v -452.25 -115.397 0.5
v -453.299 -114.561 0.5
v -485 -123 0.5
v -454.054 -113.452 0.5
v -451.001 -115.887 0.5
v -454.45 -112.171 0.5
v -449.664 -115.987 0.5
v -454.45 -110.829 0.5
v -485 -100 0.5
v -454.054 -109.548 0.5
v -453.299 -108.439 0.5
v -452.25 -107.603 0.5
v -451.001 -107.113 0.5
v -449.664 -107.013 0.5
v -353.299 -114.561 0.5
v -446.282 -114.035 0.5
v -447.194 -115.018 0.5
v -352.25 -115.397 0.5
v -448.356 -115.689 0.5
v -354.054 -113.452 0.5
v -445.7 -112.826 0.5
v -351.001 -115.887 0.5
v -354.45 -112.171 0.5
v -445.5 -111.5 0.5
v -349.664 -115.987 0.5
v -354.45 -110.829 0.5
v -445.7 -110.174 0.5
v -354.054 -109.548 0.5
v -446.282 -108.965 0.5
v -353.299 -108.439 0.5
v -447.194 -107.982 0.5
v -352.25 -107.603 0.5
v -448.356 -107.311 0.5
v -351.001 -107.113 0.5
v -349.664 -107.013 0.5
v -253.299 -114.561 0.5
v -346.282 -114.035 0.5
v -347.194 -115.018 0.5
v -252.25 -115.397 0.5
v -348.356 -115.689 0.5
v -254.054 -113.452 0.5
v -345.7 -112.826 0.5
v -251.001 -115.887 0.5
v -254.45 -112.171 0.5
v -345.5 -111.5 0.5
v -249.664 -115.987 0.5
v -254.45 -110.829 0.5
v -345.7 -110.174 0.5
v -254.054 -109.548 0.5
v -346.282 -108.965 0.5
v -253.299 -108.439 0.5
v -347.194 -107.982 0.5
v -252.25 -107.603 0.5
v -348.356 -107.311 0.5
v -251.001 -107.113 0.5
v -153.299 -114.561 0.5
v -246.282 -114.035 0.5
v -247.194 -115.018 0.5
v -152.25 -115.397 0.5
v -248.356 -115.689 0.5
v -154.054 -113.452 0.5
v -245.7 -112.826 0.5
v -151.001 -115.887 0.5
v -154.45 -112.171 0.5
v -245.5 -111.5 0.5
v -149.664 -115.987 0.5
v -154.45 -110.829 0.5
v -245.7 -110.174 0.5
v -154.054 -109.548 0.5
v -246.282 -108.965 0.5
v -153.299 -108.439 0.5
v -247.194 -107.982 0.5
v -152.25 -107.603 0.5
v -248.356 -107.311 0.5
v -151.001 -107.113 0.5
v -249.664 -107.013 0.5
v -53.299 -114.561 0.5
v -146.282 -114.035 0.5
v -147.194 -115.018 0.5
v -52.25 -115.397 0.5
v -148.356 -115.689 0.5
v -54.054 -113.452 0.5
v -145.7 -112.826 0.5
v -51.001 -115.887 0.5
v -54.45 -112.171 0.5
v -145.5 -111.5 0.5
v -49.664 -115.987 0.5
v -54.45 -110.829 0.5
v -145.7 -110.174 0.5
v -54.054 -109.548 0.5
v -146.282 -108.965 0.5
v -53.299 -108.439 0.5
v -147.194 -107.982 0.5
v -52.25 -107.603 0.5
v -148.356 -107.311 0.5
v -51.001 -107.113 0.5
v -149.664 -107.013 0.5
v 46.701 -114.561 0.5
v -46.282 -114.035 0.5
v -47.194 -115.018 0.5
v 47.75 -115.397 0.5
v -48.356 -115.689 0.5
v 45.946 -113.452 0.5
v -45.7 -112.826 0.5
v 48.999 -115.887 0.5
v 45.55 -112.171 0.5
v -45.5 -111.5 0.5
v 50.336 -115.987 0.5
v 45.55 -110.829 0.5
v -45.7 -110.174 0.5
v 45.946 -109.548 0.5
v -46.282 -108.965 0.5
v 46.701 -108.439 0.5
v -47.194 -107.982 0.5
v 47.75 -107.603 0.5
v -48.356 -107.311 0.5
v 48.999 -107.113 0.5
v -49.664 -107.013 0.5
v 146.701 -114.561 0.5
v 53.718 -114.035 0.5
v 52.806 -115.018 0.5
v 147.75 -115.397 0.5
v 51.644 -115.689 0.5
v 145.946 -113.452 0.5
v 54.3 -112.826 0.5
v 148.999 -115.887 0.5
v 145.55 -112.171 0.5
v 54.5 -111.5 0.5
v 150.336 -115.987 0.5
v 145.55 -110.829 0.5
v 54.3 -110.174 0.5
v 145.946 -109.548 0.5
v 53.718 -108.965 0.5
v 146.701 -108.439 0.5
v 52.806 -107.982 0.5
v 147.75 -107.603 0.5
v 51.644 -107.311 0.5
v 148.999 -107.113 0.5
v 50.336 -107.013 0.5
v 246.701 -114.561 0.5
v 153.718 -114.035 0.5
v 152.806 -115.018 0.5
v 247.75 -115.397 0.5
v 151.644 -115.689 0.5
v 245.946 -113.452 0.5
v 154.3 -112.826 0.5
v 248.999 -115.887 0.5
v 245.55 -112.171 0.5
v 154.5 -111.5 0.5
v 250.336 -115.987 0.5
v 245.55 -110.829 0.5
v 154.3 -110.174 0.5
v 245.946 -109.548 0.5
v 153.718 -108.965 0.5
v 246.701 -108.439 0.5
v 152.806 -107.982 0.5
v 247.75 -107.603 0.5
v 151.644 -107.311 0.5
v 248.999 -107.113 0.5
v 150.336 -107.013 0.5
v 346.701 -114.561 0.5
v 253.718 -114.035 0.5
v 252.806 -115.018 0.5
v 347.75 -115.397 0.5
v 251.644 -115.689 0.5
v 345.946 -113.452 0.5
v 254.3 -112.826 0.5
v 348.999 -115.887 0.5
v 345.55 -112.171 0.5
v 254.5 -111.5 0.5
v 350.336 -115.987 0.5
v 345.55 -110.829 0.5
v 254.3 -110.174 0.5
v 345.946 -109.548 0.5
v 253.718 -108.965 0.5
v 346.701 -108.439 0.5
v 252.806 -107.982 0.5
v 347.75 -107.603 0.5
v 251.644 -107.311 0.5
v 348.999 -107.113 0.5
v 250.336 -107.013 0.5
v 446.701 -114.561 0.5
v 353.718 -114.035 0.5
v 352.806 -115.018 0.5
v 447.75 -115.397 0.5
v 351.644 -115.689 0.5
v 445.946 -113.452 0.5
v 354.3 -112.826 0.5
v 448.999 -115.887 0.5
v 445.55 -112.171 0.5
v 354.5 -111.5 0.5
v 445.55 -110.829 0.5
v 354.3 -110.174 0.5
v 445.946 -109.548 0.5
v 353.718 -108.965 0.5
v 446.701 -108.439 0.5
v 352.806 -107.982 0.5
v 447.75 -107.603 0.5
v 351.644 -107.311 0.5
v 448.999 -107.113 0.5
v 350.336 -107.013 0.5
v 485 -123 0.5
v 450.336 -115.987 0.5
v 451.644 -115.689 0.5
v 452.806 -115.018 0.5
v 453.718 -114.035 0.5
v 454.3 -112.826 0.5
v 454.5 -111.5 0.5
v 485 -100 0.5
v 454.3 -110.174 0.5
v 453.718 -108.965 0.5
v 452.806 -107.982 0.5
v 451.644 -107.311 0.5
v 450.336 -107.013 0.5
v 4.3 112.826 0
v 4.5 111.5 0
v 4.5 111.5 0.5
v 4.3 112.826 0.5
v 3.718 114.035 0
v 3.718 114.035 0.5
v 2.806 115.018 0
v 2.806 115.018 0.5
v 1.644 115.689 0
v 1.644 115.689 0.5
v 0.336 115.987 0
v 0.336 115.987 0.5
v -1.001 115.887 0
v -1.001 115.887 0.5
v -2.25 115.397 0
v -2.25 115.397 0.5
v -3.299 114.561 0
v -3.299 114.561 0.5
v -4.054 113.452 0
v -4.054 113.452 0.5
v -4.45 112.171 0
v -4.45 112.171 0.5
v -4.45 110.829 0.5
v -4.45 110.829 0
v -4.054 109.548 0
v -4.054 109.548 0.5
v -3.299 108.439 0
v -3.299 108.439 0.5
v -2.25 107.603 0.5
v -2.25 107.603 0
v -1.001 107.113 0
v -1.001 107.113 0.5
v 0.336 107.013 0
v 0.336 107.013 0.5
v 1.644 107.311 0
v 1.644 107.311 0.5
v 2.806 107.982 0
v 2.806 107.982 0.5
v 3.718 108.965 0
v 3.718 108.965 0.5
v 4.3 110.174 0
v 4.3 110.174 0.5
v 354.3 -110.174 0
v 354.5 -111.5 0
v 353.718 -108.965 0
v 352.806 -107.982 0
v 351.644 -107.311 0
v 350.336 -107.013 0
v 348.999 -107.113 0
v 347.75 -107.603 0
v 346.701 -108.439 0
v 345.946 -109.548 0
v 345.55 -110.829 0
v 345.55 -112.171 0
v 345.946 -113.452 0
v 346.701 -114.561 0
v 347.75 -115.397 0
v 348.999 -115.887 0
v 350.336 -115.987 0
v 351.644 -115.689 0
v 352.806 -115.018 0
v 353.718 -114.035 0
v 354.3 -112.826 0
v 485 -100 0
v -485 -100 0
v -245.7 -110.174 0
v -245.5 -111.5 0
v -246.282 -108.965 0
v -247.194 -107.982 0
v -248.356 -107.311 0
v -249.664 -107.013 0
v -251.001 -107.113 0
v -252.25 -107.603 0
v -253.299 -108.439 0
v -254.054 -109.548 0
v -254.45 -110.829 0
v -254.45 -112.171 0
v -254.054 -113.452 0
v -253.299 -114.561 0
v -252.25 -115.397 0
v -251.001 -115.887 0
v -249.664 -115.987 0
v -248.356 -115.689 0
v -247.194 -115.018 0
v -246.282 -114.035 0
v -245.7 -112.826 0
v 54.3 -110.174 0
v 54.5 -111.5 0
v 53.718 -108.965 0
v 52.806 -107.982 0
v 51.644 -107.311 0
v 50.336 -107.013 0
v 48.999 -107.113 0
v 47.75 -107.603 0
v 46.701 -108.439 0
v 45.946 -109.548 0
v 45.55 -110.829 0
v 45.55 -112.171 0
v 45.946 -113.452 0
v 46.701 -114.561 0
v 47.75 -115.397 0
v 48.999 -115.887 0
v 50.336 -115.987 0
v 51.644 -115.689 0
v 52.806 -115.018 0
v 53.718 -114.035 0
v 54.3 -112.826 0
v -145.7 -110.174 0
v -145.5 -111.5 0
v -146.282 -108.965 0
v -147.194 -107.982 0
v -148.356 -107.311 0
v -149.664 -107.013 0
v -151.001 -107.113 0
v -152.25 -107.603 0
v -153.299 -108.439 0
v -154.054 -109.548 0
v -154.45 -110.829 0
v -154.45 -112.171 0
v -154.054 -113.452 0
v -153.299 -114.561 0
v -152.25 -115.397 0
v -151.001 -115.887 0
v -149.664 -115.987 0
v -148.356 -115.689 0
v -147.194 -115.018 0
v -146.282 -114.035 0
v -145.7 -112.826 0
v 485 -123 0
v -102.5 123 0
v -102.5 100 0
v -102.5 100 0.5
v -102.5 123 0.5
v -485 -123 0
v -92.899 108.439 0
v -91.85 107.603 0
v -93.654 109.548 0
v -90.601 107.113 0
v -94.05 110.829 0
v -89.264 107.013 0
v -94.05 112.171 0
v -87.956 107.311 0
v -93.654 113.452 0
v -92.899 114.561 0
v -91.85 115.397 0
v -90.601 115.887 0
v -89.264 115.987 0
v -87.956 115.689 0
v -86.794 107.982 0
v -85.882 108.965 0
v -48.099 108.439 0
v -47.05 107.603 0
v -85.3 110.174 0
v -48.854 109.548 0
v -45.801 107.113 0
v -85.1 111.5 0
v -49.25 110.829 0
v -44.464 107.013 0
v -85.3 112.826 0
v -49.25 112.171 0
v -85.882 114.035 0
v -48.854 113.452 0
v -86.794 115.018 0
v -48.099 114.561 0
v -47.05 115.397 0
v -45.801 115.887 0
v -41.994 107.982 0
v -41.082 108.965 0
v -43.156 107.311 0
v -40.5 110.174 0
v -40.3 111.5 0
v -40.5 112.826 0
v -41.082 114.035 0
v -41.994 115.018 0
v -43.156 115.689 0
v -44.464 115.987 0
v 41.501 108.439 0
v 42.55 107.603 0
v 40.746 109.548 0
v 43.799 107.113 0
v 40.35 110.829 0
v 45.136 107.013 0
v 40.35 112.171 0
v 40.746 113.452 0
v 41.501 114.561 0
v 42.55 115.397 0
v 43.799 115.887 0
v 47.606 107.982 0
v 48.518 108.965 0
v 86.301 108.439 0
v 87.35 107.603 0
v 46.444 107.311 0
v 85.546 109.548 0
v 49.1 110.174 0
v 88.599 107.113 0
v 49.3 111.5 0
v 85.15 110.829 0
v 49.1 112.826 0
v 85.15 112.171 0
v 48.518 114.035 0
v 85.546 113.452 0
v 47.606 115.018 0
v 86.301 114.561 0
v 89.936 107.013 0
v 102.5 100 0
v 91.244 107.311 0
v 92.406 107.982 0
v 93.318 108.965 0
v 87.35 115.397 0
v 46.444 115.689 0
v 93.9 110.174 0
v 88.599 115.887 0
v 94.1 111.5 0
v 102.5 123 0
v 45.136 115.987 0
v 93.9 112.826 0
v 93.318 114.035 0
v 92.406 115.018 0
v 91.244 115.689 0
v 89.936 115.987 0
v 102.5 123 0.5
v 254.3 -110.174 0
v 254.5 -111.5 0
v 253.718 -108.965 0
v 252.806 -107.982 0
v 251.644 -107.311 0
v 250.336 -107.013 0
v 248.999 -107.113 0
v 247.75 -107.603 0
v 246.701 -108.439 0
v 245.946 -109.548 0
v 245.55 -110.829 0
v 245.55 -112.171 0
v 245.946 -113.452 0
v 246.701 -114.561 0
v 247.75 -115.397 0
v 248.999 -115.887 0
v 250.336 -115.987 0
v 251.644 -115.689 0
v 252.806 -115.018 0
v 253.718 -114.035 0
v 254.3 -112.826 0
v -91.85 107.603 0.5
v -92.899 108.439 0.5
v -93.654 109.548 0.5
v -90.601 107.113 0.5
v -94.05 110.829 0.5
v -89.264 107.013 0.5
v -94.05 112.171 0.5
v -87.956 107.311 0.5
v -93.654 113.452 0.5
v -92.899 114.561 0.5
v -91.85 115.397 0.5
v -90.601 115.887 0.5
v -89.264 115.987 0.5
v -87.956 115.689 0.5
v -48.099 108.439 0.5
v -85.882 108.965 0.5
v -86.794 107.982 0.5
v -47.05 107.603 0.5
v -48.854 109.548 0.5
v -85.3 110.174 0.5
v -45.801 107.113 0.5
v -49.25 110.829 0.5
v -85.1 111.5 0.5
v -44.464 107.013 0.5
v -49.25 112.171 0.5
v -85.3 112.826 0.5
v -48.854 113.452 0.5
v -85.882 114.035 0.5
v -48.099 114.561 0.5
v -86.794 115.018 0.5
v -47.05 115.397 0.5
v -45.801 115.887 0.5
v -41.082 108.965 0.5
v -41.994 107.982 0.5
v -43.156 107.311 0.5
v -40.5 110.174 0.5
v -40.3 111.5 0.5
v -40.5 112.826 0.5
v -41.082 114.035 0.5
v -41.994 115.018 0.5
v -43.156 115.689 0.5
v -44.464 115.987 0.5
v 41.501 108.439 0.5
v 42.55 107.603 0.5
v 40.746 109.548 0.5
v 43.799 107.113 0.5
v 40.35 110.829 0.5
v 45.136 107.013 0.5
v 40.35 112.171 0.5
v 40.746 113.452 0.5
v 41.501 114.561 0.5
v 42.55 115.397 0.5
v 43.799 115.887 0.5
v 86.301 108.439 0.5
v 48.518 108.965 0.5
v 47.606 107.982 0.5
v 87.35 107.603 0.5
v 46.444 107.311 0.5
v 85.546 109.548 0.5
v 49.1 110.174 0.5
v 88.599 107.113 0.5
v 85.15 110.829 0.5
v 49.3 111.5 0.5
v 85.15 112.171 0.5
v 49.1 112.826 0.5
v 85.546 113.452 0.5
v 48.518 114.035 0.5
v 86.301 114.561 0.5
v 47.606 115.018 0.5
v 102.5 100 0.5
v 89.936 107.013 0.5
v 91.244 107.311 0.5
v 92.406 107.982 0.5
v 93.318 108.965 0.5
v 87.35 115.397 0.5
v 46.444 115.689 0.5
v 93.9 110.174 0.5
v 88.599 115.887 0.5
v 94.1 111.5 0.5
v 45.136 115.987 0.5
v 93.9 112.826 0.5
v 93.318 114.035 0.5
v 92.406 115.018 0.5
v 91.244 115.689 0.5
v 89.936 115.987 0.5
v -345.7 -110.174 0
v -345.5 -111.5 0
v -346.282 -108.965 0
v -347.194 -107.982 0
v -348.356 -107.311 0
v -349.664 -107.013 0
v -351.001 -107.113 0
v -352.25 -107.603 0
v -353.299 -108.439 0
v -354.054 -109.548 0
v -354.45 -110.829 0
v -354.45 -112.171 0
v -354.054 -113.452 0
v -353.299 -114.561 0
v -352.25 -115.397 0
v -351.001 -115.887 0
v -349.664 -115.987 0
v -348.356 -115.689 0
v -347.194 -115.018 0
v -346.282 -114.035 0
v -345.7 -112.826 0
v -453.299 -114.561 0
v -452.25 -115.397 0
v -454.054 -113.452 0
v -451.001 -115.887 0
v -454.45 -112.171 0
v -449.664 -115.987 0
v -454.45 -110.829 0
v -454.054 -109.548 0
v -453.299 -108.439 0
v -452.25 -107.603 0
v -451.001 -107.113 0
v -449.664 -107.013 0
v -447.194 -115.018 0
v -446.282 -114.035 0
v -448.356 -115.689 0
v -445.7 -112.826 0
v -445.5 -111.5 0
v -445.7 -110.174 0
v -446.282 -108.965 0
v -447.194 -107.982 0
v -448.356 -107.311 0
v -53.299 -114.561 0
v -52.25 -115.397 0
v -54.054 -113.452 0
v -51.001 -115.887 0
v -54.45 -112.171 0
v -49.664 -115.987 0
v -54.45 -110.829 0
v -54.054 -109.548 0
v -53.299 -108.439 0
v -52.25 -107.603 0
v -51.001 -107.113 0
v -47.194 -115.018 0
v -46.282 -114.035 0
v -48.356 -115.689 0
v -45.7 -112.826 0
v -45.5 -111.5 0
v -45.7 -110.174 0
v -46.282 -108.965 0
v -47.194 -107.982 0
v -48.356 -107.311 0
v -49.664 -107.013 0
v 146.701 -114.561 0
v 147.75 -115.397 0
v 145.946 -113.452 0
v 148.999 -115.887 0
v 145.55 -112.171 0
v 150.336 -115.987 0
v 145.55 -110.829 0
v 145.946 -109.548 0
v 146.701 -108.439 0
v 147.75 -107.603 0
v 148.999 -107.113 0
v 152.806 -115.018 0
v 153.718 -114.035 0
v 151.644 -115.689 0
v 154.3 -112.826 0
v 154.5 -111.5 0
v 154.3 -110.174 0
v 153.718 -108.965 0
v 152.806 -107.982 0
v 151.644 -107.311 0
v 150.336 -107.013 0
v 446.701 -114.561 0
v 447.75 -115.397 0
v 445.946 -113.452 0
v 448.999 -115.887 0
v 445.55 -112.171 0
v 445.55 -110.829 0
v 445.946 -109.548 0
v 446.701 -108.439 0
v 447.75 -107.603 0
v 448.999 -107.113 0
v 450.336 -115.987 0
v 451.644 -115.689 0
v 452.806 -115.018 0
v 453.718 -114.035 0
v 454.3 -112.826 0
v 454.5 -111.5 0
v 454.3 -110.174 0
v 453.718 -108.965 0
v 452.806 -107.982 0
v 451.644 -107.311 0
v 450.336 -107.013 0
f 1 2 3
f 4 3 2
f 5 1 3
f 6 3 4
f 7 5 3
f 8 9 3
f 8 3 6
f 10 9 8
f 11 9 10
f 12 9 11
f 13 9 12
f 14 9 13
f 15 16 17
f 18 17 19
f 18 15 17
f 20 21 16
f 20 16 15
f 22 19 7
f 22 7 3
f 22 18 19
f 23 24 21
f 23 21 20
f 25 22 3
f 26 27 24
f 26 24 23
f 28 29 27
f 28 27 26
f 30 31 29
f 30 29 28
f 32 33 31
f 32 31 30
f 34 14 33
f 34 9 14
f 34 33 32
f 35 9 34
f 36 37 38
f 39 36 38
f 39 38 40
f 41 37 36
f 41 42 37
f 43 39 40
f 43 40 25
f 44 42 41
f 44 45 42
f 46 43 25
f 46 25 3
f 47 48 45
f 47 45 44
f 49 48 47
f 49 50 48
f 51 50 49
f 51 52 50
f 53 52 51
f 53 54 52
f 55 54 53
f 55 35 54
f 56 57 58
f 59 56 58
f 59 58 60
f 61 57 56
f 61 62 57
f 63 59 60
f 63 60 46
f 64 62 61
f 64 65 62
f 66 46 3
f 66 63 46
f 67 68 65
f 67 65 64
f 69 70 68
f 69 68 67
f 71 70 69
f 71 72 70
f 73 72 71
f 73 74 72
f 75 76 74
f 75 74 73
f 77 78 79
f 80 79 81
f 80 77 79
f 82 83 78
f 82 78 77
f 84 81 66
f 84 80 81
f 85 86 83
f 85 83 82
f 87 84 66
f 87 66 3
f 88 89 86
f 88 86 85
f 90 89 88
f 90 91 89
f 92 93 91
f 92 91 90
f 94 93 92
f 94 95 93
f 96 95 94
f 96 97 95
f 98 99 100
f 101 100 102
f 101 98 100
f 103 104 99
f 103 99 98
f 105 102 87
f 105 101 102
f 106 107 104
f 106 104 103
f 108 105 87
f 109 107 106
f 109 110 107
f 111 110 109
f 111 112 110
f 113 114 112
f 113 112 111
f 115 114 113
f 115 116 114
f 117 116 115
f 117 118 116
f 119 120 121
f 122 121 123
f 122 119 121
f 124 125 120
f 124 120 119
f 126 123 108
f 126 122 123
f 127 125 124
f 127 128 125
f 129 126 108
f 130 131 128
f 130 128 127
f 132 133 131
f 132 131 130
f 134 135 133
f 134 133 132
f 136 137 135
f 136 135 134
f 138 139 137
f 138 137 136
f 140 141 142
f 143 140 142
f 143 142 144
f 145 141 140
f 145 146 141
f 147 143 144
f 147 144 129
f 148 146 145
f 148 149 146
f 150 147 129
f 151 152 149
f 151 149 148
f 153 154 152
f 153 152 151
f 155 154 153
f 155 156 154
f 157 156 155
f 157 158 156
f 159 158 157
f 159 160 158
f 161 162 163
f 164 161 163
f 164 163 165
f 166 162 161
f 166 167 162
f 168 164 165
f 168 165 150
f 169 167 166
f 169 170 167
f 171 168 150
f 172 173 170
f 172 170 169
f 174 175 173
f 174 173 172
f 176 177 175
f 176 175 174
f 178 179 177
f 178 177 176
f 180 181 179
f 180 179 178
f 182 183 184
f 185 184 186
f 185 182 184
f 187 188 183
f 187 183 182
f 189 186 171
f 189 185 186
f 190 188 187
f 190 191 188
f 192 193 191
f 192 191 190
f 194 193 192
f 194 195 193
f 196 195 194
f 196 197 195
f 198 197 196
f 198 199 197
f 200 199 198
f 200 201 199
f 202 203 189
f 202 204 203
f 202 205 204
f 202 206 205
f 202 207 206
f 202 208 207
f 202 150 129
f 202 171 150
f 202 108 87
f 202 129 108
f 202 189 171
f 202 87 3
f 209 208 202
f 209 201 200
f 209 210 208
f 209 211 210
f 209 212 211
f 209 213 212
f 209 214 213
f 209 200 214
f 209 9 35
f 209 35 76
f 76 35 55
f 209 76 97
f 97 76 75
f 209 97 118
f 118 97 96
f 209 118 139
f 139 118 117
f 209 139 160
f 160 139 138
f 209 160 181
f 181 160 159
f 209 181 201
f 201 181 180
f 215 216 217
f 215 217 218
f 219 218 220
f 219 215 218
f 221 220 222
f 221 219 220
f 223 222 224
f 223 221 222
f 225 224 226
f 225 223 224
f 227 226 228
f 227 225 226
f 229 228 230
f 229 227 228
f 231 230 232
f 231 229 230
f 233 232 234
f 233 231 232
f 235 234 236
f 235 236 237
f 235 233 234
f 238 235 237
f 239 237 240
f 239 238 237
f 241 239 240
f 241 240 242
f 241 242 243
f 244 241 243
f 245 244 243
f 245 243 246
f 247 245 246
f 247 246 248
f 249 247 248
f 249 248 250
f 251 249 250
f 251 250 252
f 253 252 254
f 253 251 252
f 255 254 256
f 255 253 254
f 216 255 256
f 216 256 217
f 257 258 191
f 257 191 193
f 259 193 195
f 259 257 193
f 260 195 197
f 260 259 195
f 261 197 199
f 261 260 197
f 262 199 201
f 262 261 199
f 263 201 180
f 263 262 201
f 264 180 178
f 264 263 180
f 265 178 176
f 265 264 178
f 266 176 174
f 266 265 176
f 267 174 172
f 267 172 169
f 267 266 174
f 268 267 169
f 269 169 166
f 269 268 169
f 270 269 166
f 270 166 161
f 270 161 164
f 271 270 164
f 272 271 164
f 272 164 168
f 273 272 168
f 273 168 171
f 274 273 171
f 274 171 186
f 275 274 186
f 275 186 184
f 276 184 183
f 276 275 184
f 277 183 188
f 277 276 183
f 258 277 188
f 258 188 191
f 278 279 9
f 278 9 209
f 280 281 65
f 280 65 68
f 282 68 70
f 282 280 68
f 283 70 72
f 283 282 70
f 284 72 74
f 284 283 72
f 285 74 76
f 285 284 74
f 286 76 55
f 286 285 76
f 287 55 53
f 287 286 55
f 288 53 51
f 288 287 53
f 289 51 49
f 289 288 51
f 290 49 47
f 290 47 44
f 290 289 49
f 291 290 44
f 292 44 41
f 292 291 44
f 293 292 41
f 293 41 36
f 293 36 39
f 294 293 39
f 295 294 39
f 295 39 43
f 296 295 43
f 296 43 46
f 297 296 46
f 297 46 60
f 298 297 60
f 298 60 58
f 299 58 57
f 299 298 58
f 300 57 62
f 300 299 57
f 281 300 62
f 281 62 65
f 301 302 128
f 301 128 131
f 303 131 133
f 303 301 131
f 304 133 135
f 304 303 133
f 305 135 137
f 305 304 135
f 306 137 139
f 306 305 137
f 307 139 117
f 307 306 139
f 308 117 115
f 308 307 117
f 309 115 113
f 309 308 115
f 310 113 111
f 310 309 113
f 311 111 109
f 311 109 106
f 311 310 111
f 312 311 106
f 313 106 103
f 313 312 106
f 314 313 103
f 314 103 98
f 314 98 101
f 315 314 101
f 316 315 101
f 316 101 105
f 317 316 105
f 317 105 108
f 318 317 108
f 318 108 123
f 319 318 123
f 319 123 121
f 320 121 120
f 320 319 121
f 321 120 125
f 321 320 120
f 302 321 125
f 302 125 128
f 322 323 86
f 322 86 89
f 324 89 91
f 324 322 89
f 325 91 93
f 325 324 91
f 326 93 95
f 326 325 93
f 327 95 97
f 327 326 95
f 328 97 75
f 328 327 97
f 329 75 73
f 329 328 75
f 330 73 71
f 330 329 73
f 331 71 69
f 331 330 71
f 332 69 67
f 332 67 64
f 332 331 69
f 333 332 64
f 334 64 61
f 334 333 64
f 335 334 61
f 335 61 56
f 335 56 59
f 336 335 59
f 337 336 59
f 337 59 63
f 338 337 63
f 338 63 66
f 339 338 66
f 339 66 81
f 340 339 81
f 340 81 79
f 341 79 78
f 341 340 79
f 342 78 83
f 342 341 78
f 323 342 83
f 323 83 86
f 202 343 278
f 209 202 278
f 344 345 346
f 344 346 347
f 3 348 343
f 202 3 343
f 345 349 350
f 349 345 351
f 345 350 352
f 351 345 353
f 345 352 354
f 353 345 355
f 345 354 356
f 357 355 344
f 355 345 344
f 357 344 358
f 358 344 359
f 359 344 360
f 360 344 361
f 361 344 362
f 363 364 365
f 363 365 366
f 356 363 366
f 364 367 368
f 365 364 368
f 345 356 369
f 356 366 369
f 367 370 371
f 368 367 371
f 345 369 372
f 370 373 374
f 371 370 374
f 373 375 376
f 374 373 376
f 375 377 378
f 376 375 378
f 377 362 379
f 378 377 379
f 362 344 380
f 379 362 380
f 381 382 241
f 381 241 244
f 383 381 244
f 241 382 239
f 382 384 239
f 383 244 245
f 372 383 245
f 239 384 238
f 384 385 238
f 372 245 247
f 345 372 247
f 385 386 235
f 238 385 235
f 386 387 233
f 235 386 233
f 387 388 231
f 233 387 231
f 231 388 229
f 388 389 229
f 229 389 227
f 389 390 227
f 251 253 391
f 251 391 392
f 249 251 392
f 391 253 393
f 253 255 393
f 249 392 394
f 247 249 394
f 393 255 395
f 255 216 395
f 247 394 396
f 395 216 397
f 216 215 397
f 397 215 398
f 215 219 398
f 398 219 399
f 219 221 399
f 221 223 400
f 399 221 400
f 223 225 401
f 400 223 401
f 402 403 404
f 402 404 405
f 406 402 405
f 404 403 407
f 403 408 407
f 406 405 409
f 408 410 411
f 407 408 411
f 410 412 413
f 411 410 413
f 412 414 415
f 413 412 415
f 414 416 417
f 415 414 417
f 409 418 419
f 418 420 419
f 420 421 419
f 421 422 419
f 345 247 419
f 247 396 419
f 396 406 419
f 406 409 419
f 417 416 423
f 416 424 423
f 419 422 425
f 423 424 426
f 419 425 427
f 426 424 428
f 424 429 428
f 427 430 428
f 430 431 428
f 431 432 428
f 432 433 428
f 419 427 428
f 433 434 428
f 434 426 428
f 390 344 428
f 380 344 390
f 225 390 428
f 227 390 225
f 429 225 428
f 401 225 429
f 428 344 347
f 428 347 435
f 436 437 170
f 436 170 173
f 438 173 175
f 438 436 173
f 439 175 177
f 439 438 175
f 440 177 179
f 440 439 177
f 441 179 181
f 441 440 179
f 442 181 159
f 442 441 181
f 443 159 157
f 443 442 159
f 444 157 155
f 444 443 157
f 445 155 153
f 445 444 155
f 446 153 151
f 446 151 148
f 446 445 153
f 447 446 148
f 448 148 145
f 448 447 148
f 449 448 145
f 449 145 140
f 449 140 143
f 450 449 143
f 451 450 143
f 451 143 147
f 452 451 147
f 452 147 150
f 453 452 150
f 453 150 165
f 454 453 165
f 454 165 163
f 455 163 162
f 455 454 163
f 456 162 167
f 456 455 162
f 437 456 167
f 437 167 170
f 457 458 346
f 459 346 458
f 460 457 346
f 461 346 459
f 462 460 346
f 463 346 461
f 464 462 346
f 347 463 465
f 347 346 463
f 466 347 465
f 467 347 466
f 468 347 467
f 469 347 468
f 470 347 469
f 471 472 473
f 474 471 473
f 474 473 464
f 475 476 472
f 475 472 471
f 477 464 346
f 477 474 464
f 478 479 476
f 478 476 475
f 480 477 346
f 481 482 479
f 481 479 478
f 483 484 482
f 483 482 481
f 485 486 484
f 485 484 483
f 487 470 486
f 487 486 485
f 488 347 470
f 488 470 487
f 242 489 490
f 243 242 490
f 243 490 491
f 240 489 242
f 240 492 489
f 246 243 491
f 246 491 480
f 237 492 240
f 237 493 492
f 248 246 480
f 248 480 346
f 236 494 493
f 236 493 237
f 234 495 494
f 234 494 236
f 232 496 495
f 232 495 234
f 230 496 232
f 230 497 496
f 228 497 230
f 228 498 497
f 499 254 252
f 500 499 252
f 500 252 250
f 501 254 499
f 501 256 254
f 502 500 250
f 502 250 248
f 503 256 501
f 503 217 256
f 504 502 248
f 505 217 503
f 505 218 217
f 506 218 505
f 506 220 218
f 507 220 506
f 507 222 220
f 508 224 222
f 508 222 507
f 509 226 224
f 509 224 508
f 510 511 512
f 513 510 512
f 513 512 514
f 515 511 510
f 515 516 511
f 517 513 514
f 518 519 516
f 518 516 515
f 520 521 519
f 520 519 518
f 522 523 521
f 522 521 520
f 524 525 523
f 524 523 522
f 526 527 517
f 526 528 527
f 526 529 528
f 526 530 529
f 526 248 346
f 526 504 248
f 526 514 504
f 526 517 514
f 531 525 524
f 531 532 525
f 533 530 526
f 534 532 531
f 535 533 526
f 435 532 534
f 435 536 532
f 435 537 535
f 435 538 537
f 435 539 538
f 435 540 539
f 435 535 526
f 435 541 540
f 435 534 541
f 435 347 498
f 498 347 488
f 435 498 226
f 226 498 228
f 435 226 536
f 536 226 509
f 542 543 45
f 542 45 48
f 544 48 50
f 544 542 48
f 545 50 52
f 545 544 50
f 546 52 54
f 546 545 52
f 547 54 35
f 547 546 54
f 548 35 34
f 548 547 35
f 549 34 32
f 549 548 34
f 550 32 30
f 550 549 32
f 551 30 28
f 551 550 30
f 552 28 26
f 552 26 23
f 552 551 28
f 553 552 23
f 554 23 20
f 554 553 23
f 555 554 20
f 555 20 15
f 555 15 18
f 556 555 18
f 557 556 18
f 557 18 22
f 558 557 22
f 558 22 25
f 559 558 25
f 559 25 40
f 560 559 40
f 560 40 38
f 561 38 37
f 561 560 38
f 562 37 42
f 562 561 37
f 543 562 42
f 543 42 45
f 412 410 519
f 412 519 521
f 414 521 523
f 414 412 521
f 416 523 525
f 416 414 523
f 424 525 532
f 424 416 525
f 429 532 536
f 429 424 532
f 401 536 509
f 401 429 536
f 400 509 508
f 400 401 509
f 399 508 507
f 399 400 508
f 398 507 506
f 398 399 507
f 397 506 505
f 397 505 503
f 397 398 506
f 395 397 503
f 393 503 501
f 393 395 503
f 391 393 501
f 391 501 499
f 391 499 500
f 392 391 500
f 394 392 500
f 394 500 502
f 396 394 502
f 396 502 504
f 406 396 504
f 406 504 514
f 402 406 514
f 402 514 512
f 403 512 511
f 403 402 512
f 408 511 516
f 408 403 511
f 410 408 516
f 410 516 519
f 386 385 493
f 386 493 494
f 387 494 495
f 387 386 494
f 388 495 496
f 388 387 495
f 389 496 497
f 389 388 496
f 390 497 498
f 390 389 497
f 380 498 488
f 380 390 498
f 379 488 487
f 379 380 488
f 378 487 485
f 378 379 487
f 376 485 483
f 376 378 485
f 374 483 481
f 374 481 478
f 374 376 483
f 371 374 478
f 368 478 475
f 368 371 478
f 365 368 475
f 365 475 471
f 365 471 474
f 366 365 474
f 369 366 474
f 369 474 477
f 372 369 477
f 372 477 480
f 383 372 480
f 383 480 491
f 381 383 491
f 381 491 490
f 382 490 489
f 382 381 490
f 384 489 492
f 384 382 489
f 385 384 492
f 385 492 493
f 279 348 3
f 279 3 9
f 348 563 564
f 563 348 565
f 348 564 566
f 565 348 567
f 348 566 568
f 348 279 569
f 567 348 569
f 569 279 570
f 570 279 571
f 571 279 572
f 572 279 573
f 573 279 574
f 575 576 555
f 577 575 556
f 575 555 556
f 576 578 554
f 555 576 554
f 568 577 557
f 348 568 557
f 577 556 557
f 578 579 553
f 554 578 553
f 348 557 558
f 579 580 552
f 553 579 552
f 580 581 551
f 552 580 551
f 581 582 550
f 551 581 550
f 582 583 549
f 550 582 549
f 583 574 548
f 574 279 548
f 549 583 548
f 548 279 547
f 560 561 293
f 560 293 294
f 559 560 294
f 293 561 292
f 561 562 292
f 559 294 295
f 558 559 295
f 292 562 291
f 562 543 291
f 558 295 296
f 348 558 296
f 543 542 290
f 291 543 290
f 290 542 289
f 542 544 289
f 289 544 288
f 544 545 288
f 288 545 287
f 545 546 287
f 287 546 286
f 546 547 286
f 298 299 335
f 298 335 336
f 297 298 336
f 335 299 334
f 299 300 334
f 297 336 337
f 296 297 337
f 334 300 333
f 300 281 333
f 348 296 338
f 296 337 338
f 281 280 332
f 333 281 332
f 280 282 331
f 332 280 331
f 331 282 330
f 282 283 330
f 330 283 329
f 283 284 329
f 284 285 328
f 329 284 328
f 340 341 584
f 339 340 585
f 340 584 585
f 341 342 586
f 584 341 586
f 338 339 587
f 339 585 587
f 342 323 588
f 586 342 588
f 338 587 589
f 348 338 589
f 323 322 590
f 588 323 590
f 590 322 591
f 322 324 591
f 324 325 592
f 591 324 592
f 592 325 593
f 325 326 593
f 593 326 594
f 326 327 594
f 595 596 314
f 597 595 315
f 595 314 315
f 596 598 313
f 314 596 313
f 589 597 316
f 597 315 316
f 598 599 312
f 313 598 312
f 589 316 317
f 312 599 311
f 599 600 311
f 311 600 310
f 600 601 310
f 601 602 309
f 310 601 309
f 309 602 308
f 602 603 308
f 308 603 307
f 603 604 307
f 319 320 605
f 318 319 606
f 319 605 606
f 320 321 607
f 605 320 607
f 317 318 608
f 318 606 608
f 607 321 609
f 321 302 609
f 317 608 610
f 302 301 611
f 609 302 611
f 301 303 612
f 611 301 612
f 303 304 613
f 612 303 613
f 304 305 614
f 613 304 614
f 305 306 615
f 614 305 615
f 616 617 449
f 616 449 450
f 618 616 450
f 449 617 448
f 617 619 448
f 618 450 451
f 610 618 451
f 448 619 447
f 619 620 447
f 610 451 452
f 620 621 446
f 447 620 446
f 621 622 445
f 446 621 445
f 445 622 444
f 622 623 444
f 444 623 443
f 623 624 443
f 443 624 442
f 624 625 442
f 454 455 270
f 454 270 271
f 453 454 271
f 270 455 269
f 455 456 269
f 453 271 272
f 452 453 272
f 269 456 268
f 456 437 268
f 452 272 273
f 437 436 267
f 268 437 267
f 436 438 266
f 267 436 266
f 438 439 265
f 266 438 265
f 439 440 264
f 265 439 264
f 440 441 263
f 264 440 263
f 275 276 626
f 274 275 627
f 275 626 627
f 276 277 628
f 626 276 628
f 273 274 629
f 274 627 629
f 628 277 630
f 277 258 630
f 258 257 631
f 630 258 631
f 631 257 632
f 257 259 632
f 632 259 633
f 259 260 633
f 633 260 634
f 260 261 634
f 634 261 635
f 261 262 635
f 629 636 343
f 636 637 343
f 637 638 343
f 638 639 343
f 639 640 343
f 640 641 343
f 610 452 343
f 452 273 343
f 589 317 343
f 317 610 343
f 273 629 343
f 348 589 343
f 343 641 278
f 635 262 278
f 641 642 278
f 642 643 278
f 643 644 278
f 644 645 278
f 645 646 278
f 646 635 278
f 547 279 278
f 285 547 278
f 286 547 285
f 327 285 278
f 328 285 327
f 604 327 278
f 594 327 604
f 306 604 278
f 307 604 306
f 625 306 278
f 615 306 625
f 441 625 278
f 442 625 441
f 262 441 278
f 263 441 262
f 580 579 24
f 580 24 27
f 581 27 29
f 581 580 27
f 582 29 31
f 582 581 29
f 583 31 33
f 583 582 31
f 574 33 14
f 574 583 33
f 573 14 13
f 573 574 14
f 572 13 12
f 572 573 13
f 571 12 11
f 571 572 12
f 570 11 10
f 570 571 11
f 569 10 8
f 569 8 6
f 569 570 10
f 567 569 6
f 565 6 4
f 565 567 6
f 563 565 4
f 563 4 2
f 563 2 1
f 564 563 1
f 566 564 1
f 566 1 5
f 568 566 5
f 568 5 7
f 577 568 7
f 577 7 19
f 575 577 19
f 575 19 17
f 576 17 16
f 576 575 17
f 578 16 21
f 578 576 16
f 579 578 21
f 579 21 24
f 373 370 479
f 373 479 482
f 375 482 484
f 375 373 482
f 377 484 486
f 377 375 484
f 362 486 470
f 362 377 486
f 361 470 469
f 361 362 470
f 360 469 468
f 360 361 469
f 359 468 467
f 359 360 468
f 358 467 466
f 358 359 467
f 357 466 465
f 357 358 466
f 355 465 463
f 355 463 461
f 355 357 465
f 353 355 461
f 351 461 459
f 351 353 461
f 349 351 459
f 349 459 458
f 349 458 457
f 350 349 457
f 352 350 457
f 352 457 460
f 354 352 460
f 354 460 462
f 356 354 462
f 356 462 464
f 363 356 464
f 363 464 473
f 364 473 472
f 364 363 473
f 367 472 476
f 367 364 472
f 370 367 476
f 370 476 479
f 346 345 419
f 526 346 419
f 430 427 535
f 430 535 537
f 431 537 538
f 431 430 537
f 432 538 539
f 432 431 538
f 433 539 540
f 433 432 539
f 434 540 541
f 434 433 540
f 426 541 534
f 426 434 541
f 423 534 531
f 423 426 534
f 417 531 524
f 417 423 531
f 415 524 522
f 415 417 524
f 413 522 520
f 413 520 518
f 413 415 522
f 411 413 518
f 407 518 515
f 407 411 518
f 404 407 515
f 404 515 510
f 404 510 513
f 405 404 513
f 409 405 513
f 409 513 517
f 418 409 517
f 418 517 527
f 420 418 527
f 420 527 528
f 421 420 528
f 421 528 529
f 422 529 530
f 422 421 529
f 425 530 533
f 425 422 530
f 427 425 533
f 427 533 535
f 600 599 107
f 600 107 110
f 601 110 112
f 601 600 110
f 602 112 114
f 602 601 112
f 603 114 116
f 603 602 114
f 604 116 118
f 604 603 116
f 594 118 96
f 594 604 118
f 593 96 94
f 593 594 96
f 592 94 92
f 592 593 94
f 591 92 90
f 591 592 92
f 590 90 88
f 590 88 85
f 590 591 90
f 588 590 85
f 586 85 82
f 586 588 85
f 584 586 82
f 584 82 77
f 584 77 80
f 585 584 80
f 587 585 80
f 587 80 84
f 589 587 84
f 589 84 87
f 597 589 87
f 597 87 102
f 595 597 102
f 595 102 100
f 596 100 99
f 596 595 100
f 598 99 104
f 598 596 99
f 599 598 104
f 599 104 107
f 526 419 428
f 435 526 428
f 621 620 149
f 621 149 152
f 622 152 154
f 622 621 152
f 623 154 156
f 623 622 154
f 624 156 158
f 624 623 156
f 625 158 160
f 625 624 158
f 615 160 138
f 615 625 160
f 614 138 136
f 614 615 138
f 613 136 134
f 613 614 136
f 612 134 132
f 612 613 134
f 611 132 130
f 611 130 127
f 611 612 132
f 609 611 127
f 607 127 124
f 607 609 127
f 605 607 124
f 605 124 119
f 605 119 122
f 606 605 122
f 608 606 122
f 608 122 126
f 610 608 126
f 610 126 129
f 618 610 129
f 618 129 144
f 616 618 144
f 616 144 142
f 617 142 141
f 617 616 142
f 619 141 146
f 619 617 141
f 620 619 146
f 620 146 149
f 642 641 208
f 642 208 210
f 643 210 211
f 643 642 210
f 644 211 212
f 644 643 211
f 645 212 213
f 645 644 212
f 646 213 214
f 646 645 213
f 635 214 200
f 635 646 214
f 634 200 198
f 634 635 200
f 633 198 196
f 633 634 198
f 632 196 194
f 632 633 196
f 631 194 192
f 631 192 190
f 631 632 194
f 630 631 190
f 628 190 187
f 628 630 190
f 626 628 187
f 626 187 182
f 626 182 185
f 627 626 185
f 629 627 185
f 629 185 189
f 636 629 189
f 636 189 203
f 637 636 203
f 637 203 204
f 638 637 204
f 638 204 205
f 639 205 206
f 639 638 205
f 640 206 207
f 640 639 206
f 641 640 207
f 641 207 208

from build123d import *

# Parameters (mm, degrees)
F0_W     = 205
F0_H     = 23
F0_R     = 4.5
F0_W_2   = 970
F1_DEPTH = 0.5


with BuildPart() as f1:
    # F0 (on Top) → F1 (new body)
    with BuildSketch(Plane.XY):
        with Locations((0, 111.5)):
            Rectangle(F0_W, F0_H)
        with Locations((-89.6, 111.5)):
            Circle(F0_R, mode=Mode.SUBTRACT)
        with Locations((-44.8, 111.5)):
            Circle(F0_R, mode=Mode.SUBTRACT)
        with Locations((0, 111.5)):
            Circle(F0_R, mode=Mode.SUBTRACT)
        with Locations((44.8, 111.5)):
            Circle(F0_R, mode=Mode.SUBTRACT)
        with Locations((89.6, 111.5)):
            Circle(F0_R, mode=Mode.SUBTRACT)
        with Locations((0, -111.5)):
            Rectangle(F0_W_2, F0_H)
        with Locations((-450, -111.5)):
            Circle(F0_R, mode=Mode.SUBTRACT)
        with Locations((-350, -111.5)):
            Circle(F0_R, mode=Mode.SUBTRACT)
        with Locations((-250, -111.5)):
            Circle(F0_R, mode=Mode.SUBTRACT)
        with Locations((-150, -111.5)):
            Circle(F0_R, mode=Mode.SUBTRACT)
        with Locations((-50, -111.5)):
            Circle(F0_R, mode=Mode.SUBTRACT)
        with Locations((50, -111.5)):
            Circle(F0_R, mode=Mode.SUBTRACT)
        with Locations((150, -111.5)):
            Circle(F0_R, mode=Mode.SUBTRACT)
        with Locations((250, -111.5)):
            Circle(F0_R, mode=Mode.SUBTRACT)
        with Locations((350, -111.5)):
            Circle(F0_R, mode=Mode.SUBTRACT)
        with Locations((450, -111.5)):
            Circle(F0_R, mode=Mode.SUBTRACT)
    extrude(amount=F1_DEPTH)


solid = f1.part
